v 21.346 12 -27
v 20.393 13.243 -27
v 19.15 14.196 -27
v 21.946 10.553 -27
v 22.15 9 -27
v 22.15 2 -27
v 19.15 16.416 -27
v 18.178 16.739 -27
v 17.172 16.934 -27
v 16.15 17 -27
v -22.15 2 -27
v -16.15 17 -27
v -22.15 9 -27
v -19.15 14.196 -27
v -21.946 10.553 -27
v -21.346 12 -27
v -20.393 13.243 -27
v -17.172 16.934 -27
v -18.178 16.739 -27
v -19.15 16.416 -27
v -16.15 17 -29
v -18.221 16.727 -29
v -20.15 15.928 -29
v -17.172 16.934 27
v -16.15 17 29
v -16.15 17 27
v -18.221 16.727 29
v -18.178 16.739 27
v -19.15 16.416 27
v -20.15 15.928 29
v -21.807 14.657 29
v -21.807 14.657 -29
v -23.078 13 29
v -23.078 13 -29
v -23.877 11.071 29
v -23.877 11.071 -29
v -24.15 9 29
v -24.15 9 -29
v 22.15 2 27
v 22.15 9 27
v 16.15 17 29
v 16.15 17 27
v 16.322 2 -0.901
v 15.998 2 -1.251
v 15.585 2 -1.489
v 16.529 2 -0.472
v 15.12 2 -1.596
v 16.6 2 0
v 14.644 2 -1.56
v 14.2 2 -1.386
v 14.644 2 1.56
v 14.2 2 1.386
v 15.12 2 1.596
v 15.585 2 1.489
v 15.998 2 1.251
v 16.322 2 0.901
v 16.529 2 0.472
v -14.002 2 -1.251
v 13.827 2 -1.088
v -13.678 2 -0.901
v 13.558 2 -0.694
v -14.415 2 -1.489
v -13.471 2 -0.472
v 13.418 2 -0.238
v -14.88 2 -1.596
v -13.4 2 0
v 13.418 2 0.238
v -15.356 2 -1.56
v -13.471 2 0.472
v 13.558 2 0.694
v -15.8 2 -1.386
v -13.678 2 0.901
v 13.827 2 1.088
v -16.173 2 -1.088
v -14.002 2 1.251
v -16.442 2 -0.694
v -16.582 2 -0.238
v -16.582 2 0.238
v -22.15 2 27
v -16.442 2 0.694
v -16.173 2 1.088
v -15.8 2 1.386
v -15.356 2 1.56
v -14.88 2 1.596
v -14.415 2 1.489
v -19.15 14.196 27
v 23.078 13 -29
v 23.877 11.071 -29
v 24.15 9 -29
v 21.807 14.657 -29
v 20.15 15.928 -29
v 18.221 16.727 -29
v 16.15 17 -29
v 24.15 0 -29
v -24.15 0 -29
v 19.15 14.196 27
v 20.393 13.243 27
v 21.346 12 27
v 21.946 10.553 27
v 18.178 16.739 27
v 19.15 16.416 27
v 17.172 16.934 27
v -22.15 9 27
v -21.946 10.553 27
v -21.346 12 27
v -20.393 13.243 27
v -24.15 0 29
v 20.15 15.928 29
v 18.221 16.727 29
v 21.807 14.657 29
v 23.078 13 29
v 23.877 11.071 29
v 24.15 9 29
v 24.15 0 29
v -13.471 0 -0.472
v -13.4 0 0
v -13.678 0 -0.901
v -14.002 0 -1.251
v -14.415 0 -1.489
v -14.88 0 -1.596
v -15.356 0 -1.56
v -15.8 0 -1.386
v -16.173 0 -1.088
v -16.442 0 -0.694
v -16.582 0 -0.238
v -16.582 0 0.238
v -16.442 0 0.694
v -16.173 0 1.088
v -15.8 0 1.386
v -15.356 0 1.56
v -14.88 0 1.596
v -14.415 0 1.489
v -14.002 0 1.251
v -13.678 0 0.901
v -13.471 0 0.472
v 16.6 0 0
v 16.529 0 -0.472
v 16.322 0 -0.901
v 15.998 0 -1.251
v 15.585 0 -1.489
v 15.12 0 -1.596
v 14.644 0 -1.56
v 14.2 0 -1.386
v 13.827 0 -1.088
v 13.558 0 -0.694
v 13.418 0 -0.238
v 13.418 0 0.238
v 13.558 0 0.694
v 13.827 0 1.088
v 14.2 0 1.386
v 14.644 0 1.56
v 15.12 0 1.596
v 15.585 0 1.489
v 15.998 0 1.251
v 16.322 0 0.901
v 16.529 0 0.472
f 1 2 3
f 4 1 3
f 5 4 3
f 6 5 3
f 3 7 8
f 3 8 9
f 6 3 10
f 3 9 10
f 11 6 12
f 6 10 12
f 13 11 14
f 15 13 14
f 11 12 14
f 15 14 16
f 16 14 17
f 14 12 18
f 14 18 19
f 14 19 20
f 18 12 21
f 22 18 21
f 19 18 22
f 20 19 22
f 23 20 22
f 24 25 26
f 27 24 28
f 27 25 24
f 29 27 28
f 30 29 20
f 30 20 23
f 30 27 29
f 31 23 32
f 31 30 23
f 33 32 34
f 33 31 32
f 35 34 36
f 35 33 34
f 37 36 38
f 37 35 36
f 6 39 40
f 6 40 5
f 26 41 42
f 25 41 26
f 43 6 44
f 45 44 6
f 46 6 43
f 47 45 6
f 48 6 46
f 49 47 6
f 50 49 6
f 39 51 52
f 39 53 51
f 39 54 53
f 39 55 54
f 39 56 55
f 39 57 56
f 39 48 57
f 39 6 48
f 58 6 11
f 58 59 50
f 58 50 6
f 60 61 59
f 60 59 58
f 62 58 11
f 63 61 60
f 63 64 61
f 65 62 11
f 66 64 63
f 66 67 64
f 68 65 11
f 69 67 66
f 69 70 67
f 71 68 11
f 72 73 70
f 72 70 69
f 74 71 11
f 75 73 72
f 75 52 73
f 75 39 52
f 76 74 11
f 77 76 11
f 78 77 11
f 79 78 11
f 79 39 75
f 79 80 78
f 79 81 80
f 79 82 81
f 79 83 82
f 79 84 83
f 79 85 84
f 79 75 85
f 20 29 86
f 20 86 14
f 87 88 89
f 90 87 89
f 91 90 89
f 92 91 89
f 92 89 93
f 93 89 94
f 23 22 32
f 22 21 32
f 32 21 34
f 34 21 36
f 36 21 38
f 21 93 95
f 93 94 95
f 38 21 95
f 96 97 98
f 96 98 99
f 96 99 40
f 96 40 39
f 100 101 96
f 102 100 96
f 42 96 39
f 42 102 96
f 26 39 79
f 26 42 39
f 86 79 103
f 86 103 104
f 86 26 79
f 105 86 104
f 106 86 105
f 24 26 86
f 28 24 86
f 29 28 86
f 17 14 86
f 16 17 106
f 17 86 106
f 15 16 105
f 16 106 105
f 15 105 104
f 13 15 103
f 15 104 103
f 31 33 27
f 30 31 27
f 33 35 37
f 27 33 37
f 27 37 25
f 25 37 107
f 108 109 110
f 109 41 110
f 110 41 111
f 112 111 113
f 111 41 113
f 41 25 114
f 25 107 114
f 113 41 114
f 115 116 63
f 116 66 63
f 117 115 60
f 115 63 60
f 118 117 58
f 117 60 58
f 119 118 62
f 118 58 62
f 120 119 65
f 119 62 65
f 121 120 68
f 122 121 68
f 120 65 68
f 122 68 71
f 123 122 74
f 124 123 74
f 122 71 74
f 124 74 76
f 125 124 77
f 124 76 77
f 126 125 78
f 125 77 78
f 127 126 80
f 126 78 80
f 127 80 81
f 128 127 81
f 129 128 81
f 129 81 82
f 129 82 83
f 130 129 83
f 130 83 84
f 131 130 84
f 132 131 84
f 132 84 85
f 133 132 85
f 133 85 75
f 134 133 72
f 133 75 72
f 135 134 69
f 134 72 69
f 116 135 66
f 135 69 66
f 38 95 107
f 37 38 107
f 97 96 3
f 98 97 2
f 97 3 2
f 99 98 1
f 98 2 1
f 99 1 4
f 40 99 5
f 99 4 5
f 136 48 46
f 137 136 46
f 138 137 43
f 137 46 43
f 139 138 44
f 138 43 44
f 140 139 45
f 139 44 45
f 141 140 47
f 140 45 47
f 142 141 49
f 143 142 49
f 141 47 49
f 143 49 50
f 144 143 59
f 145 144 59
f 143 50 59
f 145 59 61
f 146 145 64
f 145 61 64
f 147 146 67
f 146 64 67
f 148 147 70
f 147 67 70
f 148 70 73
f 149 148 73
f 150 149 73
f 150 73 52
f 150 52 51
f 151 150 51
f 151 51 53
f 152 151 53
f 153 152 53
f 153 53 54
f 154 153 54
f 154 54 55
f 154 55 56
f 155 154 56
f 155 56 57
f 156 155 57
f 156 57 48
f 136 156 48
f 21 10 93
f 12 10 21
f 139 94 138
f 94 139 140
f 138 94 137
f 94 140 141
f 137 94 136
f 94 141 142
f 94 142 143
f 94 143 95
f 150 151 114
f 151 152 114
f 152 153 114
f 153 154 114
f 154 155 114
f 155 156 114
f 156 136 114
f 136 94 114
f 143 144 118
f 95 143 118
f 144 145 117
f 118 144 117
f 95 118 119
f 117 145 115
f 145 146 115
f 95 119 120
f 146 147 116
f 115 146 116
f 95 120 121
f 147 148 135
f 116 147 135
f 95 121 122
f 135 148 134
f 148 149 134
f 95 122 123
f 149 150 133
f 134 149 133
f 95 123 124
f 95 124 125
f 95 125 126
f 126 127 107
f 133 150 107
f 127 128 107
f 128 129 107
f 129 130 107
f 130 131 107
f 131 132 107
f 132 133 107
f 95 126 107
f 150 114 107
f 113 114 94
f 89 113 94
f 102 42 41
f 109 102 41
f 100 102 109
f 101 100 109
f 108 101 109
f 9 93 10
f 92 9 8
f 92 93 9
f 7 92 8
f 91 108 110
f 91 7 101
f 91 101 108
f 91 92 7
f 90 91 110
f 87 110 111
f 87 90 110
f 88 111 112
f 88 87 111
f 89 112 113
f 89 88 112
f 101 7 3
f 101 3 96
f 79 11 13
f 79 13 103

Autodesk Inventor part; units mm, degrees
ref_plane "YZ Plane" through (0, 0, 0) normal (1, 0, 0) x (0, 1, 0)
ref_plane "XZ Plane" through (0, 0, 0) normal (0, 1, 0) x (-1, 0, 0)
ref_plane "XY Plane" through (0, 0, 0) normal (0, 0, 1) x (1, 0, 0)
sketch "スケッチ1" plane through (0, 0, 0) normal (0, 1, 0) x (-1, 0, 0)
  line L0 (-24.15, -29) -> (24.15, -29)
  line L1 (24.15, -29) -> (24.15, 29)
  line L2 (24.15, 29) -> (-24.15, 29)
  line L3 (-24.15, 29) -> (-24.15, -29)
  line L4 (-24.15, -29) -> (24.15, 29) construction
  line L5 (24.15, -29) -> (-24.15, 29) construction
  point P0 (0, 0)
  dimension "d0" = 48.3
  dimension "d1" = 58
extrude "押し出し1" add sketch "スケッチ1" along normal blind 17
fillet "フィレット1" radius 8 2 edges at (24.15, 17, 0) (-24.15, 17, 0)
shell "シェル1" thickness 2 removed faces 0
sketch "スケッチ2" plane through (0, 17, 0) normal (0, 1, 0) x (1, 0, 0)
  line L0 (22.15, 27) -> (-22.15, 27) projected
  line L1 (19.15, -27) -> (-19.15, -27)
  line L2 (-19.15, -27) -> (-19.15, 27)
  line L3 (-19.15, 27) -> (19.15, 27)
  line L4 (19.15, 27) -> (19.15, -27)
  line L5 (19.15, -27) -> (-19.15, 27) construction
  line L6 (-19.15, -27) -> (19.15, 27) construction
  line L7 (-16.15, -29) -> (-16.15, 29) projected
  point P0 (0, 0)
  dimension "d8" = 3
extrude "押し出し2" cut sketch "スケッチ2" against normal blind 5
sketch "スケッチ3" plane through (-22.15, 2, 27) normal (0, 1, 0) x (1, 0, 0)
  circle A0 centre (37.15, 27) radius 1.6
  circle A1 centre (7.15, 27) radius 1.6
  line L0 (6, 54) -> (38.3, 54) projected
  line L1 (22.15, 54) -> (22.15, 0) construction
  line L2 (0, 0) -> (44.3, 0) projected
  point P0 (22.15, 27)
  dimension "d9" = 3.2
  dimension "d11" = 30
extrude "押し出し3" cut sketch "スケッチ3" against normal through all
properties part number "battery_box"
